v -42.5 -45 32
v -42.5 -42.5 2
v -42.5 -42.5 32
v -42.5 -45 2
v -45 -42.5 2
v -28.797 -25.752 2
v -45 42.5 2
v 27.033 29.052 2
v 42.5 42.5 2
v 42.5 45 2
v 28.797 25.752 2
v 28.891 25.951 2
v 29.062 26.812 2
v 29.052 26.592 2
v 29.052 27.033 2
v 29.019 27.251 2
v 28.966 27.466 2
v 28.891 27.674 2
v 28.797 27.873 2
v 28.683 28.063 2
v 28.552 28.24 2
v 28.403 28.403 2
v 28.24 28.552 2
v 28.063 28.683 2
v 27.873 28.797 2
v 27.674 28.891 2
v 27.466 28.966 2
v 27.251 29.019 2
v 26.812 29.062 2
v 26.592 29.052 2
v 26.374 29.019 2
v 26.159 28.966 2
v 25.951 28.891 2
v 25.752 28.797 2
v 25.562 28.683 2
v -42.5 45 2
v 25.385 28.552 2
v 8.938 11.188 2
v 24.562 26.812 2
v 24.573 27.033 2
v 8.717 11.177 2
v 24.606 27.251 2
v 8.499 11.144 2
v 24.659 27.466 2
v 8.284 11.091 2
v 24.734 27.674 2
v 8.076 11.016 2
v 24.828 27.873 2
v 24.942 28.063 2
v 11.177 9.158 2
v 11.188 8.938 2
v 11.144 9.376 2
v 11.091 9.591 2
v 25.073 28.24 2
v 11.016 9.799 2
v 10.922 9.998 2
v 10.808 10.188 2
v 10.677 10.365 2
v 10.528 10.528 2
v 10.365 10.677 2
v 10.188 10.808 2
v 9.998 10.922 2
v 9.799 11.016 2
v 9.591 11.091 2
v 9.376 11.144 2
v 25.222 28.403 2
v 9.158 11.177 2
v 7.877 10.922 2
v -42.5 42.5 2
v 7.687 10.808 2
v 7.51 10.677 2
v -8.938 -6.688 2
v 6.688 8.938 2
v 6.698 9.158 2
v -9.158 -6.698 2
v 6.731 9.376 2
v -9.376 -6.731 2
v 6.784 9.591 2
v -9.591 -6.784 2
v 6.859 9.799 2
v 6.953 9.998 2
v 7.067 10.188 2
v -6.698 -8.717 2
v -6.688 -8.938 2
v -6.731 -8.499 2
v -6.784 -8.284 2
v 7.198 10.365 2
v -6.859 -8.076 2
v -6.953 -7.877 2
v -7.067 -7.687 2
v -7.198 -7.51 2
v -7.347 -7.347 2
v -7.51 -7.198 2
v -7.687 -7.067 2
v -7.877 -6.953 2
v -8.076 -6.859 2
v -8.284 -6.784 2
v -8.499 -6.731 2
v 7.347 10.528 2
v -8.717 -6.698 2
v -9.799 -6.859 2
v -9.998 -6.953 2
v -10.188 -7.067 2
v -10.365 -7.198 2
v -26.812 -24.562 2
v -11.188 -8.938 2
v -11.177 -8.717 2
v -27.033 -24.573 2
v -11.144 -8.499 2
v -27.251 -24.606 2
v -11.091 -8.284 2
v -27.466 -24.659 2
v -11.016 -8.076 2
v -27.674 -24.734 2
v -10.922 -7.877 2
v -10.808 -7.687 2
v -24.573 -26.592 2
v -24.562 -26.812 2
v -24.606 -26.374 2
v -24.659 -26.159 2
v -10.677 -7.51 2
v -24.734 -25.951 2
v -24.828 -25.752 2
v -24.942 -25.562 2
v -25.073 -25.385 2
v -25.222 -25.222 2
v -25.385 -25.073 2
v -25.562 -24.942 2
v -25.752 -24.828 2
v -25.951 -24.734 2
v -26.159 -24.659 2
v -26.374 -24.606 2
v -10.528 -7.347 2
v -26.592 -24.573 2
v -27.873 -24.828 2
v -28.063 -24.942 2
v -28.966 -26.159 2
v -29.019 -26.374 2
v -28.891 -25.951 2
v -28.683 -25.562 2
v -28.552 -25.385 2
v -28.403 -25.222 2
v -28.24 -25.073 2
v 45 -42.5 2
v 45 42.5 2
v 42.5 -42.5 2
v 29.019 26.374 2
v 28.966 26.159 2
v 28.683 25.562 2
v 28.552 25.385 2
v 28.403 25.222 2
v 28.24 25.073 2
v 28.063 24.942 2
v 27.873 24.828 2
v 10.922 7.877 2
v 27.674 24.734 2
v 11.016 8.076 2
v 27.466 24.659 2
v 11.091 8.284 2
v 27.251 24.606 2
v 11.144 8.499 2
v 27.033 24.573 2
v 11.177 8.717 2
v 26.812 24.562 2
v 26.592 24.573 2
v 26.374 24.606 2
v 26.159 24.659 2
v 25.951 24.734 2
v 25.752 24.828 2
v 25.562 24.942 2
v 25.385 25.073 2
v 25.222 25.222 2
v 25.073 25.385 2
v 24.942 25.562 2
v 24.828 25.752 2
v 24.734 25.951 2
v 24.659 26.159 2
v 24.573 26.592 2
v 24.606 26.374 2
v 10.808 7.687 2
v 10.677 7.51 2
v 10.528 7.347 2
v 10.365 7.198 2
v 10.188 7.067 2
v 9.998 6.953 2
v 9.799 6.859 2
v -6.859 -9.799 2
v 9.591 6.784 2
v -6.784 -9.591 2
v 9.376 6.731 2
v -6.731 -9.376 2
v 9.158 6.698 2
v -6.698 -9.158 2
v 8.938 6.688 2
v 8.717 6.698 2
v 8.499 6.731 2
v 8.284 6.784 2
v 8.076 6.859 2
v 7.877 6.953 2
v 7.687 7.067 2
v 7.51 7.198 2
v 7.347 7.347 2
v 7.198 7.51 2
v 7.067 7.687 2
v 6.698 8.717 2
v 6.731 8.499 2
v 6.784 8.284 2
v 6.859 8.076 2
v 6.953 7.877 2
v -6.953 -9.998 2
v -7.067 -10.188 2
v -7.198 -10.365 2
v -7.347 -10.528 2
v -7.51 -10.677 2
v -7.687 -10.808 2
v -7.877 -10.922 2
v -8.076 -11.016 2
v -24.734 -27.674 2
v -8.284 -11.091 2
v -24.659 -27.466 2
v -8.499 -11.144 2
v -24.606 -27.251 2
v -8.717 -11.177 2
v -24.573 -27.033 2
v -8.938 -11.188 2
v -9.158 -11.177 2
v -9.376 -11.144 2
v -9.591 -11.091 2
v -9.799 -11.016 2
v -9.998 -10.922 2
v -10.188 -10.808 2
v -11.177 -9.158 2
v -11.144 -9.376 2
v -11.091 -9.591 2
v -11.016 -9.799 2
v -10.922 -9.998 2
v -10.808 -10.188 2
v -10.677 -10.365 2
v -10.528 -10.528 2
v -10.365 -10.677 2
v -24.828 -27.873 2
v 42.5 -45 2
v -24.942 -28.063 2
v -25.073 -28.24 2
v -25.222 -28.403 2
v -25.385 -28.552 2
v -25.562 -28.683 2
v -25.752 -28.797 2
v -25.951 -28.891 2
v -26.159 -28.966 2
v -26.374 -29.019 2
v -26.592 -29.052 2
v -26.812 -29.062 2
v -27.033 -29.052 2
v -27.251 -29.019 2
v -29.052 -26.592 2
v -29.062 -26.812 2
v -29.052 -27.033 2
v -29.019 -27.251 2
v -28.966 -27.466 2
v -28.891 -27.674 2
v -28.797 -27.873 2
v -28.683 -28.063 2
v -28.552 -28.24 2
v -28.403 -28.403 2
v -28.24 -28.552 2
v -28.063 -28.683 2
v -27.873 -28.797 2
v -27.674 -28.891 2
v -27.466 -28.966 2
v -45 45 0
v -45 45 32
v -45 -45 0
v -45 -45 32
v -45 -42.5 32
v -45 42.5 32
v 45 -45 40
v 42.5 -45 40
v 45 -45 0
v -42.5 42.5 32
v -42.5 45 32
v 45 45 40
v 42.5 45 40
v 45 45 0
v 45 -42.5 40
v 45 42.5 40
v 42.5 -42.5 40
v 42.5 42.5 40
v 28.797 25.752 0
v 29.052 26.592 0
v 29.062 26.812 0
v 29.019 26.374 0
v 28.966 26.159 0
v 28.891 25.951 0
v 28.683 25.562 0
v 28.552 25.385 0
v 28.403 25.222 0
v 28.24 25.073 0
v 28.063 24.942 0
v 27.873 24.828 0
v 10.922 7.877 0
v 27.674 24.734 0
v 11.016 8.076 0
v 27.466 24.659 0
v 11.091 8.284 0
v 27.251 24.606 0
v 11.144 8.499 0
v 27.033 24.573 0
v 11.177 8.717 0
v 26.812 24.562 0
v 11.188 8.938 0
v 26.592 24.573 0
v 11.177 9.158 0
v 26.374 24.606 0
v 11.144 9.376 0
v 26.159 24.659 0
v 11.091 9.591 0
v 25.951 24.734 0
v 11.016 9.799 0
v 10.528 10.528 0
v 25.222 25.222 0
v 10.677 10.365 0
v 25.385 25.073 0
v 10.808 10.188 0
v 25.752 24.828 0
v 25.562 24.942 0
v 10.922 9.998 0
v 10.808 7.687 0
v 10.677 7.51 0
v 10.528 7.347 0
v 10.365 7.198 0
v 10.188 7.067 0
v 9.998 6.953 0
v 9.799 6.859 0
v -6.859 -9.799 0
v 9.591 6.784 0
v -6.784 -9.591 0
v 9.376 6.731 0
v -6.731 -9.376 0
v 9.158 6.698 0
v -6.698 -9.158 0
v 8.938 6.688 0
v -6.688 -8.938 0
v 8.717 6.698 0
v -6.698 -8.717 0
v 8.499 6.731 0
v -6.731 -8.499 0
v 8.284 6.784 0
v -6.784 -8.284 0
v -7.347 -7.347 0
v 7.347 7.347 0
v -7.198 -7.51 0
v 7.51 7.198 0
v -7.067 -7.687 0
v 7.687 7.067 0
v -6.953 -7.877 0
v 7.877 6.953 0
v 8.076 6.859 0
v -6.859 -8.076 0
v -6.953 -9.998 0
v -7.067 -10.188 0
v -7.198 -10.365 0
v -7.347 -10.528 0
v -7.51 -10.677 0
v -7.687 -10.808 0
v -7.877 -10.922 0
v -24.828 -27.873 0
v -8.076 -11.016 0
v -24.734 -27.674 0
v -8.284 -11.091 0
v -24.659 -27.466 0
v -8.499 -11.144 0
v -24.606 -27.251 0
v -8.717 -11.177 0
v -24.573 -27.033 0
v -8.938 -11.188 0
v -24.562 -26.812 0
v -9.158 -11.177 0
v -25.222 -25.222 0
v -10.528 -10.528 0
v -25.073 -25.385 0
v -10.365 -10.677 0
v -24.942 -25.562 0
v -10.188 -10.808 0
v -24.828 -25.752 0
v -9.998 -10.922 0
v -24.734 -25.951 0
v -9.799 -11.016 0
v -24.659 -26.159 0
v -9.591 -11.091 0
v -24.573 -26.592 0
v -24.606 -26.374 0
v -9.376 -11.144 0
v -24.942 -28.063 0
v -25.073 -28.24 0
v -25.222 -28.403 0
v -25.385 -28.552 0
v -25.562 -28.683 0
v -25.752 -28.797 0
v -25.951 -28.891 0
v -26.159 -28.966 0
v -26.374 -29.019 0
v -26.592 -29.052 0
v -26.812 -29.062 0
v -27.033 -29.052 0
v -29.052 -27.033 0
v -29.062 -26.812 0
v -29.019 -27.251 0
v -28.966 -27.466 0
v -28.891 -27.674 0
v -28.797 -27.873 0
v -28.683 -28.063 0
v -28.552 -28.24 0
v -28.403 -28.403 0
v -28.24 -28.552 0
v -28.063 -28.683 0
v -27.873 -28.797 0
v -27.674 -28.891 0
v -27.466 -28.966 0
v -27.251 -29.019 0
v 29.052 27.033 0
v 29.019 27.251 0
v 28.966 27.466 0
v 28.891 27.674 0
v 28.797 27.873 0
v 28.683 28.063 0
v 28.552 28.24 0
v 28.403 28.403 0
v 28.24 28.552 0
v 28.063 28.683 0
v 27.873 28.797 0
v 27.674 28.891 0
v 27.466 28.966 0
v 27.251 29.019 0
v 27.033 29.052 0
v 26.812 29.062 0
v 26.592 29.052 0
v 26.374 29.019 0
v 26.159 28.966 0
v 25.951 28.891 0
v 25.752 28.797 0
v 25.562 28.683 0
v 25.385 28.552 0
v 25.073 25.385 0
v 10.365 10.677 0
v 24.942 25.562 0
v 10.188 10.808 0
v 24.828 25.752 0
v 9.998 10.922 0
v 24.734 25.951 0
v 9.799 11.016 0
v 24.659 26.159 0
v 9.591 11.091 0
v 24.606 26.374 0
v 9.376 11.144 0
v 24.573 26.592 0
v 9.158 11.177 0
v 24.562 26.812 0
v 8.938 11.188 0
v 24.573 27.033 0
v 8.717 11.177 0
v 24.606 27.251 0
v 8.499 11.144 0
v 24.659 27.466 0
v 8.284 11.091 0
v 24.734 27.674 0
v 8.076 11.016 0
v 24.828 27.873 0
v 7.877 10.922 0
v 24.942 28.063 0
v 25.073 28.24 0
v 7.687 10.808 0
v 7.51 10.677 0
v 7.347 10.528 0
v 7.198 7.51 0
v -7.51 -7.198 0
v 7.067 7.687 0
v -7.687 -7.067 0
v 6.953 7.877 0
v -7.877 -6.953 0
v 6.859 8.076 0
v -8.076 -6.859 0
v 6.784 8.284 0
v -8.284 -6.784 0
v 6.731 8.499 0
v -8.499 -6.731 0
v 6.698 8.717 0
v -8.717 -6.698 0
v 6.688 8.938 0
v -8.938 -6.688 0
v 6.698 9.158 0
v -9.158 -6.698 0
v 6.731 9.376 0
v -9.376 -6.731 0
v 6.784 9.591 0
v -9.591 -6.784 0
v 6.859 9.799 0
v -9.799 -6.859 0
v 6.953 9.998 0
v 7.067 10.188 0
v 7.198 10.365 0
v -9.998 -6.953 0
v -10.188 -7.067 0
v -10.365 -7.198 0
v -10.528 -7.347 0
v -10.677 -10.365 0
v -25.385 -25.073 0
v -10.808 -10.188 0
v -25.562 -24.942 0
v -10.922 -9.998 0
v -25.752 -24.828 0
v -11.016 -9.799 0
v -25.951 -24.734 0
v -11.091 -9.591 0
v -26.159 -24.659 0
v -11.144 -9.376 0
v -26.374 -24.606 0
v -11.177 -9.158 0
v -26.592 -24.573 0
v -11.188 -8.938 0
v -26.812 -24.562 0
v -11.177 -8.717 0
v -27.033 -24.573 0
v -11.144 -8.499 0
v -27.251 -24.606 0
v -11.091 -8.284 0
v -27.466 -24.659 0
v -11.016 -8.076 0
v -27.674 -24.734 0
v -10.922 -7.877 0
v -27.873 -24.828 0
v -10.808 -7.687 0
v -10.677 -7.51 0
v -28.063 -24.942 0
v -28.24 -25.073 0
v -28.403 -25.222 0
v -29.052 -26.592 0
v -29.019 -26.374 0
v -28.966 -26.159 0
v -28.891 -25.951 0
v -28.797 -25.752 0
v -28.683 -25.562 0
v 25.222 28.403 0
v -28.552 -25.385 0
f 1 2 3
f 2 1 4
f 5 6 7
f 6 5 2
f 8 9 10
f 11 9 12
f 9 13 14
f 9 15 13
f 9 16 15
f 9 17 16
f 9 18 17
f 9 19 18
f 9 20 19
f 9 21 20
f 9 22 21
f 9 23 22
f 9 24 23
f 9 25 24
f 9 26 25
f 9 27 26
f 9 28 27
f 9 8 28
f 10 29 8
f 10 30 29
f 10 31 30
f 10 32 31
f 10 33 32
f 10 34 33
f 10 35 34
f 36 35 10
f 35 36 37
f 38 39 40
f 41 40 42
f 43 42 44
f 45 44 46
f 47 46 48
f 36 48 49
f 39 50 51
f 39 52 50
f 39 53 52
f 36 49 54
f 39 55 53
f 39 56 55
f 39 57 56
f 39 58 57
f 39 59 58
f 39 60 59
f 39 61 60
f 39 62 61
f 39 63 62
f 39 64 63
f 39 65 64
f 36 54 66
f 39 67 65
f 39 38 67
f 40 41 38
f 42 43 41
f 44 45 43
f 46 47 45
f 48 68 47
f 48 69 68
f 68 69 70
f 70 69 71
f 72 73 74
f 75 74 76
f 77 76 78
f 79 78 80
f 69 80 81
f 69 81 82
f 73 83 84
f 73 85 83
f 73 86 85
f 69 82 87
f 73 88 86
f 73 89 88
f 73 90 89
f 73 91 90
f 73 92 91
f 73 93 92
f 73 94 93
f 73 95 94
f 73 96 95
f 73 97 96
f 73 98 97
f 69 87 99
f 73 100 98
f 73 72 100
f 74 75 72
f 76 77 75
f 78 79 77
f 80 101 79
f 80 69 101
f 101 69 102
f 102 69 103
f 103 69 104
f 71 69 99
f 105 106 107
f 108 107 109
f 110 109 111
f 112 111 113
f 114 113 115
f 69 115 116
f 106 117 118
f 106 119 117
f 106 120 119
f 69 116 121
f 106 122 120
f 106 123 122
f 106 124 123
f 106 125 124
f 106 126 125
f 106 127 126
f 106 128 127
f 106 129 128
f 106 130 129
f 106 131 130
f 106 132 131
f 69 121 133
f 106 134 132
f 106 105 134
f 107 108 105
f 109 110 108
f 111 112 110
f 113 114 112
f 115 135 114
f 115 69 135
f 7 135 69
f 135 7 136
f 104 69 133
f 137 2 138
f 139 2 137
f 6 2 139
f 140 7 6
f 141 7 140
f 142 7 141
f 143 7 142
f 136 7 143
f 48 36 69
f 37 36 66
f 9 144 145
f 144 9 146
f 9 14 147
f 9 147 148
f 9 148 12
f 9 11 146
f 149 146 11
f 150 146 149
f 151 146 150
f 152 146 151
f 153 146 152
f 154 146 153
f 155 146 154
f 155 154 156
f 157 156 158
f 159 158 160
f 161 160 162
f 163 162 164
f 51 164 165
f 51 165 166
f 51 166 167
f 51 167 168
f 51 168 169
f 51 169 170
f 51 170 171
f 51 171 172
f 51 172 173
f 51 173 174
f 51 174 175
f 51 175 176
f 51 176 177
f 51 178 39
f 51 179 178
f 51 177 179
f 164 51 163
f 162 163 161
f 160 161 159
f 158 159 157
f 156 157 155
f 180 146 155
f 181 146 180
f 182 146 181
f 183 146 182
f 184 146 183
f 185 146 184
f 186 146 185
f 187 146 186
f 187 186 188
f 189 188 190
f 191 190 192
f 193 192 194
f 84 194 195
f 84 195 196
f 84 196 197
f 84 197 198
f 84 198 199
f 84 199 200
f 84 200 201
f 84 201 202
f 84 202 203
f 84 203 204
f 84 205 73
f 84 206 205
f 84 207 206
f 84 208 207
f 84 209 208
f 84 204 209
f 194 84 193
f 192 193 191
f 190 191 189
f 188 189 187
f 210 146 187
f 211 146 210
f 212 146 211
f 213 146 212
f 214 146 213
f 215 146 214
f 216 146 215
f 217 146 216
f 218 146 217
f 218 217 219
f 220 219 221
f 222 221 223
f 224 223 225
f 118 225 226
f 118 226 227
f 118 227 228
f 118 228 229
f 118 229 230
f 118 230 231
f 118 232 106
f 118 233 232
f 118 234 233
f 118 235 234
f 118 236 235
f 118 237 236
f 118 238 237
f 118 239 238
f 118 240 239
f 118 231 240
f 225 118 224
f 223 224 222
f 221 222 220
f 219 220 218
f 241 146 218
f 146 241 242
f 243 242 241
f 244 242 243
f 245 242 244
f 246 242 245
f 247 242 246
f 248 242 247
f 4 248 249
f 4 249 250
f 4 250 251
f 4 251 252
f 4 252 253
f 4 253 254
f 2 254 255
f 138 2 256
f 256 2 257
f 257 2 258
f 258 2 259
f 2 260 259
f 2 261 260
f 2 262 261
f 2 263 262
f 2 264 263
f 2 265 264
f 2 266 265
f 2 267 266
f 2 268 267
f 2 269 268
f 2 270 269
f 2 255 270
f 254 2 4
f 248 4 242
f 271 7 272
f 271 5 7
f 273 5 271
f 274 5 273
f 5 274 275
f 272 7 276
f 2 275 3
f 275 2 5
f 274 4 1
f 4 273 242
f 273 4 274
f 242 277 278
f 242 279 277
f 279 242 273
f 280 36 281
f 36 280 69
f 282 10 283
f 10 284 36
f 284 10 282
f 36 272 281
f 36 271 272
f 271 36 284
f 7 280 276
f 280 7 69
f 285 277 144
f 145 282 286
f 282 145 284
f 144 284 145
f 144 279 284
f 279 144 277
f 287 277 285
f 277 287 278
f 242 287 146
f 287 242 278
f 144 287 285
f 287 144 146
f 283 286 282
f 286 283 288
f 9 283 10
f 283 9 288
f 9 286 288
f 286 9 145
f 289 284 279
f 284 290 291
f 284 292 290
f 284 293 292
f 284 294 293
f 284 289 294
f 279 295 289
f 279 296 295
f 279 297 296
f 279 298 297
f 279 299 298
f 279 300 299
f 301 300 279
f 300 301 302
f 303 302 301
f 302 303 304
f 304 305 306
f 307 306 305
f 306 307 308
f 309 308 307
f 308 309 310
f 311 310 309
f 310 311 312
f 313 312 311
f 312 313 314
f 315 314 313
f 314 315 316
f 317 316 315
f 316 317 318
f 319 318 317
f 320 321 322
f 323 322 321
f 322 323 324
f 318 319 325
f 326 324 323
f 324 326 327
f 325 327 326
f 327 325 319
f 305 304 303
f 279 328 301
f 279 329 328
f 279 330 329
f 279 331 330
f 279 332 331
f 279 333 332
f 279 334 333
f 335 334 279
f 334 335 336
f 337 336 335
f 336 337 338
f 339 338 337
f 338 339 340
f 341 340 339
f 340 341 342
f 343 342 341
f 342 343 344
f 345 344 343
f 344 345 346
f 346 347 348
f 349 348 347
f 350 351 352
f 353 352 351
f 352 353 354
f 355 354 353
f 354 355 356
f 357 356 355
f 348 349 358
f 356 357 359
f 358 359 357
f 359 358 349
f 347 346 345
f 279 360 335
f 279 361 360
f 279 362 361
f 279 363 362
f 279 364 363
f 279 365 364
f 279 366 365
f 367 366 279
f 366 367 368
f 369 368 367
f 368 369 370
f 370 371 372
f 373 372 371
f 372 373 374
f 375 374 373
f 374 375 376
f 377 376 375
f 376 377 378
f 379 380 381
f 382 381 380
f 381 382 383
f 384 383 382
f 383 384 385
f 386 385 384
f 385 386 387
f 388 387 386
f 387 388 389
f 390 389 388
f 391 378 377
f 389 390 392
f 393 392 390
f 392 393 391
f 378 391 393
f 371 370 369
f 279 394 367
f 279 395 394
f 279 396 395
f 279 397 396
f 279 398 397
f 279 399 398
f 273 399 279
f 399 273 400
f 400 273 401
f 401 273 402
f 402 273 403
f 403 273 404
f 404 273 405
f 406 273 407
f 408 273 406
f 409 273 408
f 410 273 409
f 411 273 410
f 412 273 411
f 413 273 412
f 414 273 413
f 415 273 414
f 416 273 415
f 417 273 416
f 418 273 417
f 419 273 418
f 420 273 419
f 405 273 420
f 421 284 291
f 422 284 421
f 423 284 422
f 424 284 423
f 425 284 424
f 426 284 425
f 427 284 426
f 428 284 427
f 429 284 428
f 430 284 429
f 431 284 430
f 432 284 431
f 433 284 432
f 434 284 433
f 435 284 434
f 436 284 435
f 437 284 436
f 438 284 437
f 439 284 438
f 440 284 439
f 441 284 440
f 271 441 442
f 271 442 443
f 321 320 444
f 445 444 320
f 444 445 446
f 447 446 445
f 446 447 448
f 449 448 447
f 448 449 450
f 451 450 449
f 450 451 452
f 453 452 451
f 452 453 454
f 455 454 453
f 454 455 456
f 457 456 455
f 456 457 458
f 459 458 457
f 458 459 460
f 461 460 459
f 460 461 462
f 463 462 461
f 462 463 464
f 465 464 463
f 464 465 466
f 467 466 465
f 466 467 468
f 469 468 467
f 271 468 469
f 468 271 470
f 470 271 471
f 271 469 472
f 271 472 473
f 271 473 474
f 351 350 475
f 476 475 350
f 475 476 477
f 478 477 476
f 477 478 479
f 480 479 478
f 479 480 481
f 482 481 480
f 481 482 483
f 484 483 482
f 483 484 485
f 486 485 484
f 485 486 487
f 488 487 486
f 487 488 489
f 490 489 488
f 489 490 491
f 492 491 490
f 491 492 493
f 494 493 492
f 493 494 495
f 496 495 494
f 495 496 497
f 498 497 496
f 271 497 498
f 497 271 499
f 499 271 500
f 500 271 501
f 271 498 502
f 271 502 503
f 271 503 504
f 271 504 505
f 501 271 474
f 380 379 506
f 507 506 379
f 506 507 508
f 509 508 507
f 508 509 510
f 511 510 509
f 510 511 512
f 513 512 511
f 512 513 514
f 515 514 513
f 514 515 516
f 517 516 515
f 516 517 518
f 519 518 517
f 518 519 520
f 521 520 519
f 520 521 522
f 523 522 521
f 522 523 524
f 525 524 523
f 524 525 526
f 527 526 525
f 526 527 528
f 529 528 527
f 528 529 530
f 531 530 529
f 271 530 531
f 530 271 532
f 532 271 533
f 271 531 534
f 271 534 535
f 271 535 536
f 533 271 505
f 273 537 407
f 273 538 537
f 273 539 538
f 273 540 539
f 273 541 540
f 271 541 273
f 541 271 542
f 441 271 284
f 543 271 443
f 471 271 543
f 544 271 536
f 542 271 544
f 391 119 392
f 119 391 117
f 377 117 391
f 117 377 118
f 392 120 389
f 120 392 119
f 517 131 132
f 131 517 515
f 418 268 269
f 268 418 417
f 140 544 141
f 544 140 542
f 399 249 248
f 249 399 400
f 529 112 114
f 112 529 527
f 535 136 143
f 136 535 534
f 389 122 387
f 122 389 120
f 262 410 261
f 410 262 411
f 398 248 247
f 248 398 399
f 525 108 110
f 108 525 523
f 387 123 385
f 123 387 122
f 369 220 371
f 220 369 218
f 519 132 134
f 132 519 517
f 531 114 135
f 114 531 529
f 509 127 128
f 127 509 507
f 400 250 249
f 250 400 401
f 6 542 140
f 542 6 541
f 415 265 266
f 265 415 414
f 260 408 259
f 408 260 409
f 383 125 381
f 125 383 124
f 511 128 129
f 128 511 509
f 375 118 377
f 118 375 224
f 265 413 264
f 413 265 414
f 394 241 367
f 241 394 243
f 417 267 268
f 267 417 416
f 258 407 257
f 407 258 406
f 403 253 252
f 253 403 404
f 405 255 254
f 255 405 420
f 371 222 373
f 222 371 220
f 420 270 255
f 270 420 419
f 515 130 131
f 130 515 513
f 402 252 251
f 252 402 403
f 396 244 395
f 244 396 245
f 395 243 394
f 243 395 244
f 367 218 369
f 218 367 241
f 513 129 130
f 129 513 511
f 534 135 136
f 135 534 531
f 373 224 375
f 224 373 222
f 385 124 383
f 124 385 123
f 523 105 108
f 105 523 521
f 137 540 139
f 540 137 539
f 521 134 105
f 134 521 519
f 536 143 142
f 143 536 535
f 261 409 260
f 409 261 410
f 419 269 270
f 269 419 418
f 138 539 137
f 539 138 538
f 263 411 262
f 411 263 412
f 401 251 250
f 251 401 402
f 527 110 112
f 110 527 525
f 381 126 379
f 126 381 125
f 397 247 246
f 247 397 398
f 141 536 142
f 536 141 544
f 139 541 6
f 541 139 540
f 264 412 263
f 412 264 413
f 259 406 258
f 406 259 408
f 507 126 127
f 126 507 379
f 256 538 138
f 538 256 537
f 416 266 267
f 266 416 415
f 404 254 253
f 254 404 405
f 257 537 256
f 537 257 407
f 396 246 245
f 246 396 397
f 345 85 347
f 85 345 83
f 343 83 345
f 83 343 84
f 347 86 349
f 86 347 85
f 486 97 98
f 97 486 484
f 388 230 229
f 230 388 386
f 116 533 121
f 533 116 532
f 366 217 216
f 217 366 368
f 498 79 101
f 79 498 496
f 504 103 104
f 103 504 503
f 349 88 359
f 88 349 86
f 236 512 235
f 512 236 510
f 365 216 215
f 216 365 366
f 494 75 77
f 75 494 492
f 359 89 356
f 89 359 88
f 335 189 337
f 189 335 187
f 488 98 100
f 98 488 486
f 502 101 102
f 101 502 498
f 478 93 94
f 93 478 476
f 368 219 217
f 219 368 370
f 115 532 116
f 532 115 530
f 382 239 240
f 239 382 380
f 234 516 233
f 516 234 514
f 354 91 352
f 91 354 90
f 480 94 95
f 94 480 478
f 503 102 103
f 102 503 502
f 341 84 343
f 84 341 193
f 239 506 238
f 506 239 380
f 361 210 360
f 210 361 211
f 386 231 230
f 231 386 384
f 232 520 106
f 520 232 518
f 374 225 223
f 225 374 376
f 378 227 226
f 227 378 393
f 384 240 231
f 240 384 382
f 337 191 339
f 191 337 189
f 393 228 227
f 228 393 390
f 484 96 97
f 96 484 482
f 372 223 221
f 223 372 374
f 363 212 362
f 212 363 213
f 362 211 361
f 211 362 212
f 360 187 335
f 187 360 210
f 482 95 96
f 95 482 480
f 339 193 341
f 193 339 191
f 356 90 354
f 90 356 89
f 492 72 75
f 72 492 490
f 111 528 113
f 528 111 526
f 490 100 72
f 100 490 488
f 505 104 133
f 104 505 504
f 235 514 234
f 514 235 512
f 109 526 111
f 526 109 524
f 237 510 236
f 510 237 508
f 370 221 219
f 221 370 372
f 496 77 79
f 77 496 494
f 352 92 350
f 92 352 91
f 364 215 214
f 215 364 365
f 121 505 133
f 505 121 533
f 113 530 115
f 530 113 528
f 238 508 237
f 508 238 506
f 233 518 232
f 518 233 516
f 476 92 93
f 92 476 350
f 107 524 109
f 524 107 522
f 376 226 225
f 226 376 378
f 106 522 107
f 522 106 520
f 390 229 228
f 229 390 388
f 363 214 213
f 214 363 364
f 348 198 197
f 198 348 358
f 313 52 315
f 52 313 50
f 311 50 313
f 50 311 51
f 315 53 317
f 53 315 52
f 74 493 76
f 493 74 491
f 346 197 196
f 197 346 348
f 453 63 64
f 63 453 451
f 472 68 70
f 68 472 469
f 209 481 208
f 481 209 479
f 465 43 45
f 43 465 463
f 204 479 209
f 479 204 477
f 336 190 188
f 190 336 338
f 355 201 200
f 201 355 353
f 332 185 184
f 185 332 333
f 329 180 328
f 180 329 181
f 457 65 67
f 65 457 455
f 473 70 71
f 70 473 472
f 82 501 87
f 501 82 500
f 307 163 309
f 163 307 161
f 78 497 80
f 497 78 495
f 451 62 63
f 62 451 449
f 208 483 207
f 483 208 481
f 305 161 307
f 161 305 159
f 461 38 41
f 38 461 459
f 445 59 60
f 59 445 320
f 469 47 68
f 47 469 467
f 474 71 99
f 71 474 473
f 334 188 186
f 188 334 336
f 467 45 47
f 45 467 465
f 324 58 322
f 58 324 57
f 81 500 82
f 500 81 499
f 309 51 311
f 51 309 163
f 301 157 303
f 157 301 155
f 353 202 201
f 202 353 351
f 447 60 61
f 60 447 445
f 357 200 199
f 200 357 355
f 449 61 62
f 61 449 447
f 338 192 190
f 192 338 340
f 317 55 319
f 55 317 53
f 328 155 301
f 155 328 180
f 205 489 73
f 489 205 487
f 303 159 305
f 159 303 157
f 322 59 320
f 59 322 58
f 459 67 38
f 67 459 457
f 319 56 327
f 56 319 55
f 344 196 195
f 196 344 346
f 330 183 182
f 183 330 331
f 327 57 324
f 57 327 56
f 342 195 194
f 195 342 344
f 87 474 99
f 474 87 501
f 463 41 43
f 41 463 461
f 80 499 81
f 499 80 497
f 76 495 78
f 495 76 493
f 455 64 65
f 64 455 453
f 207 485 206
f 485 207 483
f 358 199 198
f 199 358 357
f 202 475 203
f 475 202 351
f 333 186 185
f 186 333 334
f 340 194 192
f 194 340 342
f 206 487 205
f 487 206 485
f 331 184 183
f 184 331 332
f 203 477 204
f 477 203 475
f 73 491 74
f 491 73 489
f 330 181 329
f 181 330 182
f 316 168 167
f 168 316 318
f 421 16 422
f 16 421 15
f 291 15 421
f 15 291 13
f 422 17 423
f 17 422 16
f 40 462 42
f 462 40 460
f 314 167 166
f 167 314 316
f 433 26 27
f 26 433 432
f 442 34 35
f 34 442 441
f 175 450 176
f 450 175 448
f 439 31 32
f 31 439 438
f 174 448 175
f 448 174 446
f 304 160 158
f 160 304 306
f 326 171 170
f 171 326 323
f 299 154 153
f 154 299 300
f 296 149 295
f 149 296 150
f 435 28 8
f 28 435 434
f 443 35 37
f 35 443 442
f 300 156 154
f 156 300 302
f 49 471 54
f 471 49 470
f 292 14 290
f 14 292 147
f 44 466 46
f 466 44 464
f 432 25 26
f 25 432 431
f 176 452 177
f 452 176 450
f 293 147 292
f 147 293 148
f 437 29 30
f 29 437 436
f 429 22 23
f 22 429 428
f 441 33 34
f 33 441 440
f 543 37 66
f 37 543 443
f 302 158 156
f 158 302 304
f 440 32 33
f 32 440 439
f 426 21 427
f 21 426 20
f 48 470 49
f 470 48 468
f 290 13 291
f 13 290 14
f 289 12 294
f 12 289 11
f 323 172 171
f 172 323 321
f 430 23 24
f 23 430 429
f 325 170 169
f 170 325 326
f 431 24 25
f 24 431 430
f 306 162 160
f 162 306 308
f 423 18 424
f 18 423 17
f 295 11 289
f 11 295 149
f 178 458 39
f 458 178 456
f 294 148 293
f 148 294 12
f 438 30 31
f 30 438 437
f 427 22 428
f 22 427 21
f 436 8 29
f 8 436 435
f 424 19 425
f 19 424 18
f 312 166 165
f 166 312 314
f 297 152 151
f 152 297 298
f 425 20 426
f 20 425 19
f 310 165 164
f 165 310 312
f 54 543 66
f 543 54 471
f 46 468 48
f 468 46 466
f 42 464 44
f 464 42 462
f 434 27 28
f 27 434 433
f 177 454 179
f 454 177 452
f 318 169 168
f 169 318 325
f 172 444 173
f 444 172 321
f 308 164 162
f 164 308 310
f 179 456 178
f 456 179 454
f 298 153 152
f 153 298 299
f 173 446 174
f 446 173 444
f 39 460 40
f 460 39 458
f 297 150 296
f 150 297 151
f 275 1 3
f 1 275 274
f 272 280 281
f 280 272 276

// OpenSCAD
// DIY magnetic stirrer housing (print orientation: top plate down, box open upward)
// Units: mm

// ---------- Parameters ----------
outer_size      = 90;    // outer length and width (X, Y)
top_plate_t     = 2;     // top plate thickness (z = 0 to 2)
wall_t          = 2.5;   // wall thickness
open_top_z      = 40;    // height of open top (walls run z = 2 to 40)
hole_d          = 4.5;   // screw hole diameter (M4)
hole_pattern    = 71.5;  // square pitch of screw holes
hole_count      = 4;     // number of screw holes
notch_w         = 12;    // cable notch width
notch_bottom_z  = 32;    // notch floor (8 mm up from open edge, which is at z = 40)
eps             = 0.5;   // cutter overshoot past faces

$fn = 64;

// ---------- Model ----------
difference() {
    union() {
        // Top plate (lies on the bed)
        translate([-outer_size/2, -outer_size/2, 0])
            cube([outer_size, outer_size, top_plate_t]);

        // Four walls rising from the plate to the open top
        for (sx = [-1, 1], sy = [-1, 1])
            translate([sx > 0 ? outer_size/2 - wall_t : -outer_size/2,
                       sy > 0 ? outer_size/2 - wall_t : -outer_size/2,
                       top_plate_t])
                cube([wall_t, wall_t, open_top_z - top_plate_t]);
    }

    // Screw holes through the top plate on a centred square pattern
    for (i = [0 : hole_count - 1]) {
        x = -hole_pattern/2 + (i + 0.5) * hole_pattern / hole_count;
        y = -hole_pattern/2 + (i + 0.5) * hole_pattern / hole_count;
        translate([x, y, -eps])
            cylinder(d = hole_d, h = top_plate_t + 2*eps);
    }

    // Cable notch cut into one wall, reaching up from z = 32 to the open edge
    translate([-outer_size/2 - eps, -outer_size/2 - eps, notch_bottom_z])
        cube([notch_w + 2*eps, outer_size + 2*eps, open_top_z - notch_bottom_z]);
}
